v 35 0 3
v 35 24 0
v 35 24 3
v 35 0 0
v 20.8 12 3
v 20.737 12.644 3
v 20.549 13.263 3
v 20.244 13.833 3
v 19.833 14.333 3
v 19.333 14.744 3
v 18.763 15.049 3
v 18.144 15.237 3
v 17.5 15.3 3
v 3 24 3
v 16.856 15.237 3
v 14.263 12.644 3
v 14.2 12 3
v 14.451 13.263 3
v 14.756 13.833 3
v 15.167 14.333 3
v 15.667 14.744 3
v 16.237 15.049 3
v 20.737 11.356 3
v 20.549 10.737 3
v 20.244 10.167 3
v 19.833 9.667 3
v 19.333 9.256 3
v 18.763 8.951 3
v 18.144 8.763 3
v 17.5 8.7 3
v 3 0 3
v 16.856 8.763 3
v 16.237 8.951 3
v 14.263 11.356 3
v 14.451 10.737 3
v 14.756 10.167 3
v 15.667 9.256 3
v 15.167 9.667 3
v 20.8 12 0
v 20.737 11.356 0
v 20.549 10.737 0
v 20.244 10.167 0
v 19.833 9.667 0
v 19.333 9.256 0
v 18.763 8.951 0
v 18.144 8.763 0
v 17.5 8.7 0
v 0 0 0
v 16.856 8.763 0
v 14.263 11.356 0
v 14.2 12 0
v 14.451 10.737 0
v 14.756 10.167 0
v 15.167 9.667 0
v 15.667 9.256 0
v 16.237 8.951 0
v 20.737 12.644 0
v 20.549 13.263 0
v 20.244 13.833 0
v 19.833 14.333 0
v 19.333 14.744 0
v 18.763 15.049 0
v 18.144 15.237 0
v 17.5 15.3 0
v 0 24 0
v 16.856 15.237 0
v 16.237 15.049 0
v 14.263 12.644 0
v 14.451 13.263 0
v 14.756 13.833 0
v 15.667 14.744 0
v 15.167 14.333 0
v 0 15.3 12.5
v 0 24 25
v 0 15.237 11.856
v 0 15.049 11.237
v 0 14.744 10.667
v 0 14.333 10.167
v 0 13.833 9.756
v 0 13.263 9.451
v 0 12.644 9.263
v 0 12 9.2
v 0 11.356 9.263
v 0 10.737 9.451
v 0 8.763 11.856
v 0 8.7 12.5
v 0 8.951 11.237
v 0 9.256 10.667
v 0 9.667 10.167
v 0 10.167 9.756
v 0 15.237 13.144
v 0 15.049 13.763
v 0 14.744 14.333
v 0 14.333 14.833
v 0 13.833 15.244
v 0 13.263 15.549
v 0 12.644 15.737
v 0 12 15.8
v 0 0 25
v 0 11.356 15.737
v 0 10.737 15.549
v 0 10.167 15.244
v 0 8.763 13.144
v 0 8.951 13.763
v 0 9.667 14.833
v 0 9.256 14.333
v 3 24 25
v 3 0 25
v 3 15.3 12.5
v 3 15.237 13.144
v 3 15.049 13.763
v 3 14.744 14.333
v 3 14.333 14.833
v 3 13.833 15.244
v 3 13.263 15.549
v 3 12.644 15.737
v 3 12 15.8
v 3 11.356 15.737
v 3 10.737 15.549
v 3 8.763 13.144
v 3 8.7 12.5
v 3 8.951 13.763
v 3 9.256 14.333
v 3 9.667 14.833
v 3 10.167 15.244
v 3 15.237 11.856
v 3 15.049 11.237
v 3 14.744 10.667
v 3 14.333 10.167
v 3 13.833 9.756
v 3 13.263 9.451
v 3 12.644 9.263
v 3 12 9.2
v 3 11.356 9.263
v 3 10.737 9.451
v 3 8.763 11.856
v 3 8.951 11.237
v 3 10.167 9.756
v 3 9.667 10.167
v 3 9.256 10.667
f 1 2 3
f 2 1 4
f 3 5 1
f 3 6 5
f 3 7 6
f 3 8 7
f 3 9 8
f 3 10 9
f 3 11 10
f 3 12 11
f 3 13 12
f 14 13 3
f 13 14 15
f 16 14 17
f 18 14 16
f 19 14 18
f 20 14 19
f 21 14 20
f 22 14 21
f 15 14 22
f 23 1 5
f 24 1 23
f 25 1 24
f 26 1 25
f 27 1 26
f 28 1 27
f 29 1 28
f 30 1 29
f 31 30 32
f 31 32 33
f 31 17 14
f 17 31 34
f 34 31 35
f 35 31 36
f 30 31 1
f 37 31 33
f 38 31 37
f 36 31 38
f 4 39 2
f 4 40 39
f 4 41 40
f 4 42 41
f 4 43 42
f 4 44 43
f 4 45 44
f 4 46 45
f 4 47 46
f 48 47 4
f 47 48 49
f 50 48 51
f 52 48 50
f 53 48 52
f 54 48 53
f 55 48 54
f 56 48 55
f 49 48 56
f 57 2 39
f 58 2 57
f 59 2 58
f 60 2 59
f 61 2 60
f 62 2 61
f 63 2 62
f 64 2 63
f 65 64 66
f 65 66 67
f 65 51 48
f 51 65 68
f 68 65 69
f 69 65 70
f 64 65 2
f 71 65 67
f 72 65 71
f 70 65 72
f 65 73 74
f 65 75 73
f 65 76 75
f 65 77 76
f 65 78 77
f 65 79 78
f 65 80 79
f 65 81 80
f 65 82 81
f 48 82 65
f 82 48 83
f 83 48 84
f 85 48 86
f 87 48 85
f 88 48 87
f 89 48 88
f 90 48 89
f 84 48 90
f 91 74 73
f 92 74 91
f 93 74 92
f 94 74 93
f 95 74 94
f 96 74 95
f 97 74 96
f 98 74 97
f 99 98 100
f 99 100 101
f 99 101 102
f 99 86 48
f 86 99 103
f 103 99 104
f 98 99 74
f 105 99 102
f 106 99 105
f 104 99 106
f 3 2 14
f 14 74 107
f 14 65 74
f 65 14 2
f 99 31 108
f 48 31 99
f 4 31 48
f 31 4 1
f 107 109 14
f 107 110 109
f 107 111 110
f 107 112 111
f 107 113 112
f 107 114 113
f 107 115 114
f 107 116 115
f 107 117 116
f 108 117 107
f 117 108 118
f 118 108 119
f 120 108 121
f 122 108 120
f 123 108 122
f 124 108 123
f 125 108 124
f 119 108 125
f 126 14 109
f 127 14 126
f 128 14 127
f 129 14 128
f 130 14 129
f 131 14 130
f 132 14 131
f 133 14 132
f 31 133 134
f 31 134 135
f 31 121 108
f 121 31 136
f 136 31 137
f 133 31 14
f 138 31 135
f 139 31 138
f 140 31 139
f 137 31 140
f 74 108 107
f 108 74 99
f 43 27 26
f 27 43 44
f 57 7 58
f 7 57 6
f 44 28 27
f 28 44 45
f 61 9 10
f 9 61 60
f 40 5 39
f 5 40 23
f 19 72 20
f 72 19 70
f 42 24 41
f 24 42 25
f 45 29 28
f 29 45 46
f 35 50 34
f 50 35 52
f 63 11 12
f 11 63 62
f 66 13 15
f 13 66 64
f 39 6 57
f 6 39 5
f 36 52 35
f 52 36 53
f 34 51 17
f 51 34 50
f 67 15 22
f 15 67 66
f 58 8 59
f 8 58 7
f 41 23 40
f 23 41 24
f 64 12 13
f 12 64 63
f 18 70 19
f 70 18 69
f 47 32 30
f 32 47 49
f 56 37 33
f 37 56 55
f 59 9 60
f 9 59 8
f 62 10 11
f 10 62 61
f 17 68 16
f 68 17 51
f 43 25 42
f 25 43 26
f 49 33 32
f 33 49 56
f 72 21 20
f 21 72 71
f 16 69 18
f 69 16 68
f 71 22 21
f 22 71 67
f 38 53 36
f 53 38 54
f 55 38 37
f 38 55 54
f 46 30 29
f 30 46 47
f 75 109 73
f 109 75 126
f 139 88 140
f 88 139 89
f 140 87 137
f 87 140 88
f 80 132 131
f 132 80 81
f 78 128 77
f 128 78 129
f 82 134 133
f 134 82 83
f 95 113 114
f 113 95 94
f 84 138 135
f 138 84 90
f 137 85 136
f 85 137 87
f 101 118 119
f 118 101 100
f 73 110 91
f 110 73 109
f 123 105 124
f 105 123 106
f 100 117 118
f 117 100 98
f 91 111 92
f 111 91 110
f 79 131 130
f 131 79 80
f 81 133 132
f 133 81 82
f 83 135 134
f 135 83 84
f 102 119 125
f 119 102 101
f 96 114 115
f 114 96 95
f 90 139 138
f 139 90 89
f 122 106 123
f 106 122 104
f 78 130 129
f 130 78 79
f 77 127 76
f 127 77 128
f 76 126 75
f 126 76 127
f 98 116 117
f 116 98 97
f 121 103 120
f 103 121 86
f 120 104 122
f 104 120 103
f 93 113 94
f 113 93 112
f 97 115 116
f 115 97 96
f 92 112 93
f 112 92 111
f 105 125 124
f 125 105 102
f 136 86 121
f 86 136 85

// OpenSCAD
$fn = 32;

// ----------------------------------------------------------------------
// L-bracket: 35 x 24 x 25 mm
// ----------------------------------------------------------------------

// --- parameters (mm) ---
run_out = 35;             // horizontal leg, X
rise = 25;                // vertical leg, Z
bracket_w = 24;           // bracket depth, Y
sheet_t = 3;              // plate thickness
hole_d = 6.6;             // clearance for M6

module hole_z(px, py) {
  translate([px, py, -2.5]) cylinder(h = sheet_t + 5, d = hole_d);
}
module hole_x(pz, py) {
  translate([-2.5, py, pz]) rotate([0, 90, 0]) cylinder(h = sheet_t + 5, d = hole_d);
}

difference() {
  union() {
    /* horizontal leg */
    cube([run_out, bracket_w, sheet_t]);
    /* vertical leg, overlapping the corner block */
    cube([sheet_t, bracket_w, rise]);
  }
  hole_z(17.5, 12);
  hole_x(12.5, 12);
}
